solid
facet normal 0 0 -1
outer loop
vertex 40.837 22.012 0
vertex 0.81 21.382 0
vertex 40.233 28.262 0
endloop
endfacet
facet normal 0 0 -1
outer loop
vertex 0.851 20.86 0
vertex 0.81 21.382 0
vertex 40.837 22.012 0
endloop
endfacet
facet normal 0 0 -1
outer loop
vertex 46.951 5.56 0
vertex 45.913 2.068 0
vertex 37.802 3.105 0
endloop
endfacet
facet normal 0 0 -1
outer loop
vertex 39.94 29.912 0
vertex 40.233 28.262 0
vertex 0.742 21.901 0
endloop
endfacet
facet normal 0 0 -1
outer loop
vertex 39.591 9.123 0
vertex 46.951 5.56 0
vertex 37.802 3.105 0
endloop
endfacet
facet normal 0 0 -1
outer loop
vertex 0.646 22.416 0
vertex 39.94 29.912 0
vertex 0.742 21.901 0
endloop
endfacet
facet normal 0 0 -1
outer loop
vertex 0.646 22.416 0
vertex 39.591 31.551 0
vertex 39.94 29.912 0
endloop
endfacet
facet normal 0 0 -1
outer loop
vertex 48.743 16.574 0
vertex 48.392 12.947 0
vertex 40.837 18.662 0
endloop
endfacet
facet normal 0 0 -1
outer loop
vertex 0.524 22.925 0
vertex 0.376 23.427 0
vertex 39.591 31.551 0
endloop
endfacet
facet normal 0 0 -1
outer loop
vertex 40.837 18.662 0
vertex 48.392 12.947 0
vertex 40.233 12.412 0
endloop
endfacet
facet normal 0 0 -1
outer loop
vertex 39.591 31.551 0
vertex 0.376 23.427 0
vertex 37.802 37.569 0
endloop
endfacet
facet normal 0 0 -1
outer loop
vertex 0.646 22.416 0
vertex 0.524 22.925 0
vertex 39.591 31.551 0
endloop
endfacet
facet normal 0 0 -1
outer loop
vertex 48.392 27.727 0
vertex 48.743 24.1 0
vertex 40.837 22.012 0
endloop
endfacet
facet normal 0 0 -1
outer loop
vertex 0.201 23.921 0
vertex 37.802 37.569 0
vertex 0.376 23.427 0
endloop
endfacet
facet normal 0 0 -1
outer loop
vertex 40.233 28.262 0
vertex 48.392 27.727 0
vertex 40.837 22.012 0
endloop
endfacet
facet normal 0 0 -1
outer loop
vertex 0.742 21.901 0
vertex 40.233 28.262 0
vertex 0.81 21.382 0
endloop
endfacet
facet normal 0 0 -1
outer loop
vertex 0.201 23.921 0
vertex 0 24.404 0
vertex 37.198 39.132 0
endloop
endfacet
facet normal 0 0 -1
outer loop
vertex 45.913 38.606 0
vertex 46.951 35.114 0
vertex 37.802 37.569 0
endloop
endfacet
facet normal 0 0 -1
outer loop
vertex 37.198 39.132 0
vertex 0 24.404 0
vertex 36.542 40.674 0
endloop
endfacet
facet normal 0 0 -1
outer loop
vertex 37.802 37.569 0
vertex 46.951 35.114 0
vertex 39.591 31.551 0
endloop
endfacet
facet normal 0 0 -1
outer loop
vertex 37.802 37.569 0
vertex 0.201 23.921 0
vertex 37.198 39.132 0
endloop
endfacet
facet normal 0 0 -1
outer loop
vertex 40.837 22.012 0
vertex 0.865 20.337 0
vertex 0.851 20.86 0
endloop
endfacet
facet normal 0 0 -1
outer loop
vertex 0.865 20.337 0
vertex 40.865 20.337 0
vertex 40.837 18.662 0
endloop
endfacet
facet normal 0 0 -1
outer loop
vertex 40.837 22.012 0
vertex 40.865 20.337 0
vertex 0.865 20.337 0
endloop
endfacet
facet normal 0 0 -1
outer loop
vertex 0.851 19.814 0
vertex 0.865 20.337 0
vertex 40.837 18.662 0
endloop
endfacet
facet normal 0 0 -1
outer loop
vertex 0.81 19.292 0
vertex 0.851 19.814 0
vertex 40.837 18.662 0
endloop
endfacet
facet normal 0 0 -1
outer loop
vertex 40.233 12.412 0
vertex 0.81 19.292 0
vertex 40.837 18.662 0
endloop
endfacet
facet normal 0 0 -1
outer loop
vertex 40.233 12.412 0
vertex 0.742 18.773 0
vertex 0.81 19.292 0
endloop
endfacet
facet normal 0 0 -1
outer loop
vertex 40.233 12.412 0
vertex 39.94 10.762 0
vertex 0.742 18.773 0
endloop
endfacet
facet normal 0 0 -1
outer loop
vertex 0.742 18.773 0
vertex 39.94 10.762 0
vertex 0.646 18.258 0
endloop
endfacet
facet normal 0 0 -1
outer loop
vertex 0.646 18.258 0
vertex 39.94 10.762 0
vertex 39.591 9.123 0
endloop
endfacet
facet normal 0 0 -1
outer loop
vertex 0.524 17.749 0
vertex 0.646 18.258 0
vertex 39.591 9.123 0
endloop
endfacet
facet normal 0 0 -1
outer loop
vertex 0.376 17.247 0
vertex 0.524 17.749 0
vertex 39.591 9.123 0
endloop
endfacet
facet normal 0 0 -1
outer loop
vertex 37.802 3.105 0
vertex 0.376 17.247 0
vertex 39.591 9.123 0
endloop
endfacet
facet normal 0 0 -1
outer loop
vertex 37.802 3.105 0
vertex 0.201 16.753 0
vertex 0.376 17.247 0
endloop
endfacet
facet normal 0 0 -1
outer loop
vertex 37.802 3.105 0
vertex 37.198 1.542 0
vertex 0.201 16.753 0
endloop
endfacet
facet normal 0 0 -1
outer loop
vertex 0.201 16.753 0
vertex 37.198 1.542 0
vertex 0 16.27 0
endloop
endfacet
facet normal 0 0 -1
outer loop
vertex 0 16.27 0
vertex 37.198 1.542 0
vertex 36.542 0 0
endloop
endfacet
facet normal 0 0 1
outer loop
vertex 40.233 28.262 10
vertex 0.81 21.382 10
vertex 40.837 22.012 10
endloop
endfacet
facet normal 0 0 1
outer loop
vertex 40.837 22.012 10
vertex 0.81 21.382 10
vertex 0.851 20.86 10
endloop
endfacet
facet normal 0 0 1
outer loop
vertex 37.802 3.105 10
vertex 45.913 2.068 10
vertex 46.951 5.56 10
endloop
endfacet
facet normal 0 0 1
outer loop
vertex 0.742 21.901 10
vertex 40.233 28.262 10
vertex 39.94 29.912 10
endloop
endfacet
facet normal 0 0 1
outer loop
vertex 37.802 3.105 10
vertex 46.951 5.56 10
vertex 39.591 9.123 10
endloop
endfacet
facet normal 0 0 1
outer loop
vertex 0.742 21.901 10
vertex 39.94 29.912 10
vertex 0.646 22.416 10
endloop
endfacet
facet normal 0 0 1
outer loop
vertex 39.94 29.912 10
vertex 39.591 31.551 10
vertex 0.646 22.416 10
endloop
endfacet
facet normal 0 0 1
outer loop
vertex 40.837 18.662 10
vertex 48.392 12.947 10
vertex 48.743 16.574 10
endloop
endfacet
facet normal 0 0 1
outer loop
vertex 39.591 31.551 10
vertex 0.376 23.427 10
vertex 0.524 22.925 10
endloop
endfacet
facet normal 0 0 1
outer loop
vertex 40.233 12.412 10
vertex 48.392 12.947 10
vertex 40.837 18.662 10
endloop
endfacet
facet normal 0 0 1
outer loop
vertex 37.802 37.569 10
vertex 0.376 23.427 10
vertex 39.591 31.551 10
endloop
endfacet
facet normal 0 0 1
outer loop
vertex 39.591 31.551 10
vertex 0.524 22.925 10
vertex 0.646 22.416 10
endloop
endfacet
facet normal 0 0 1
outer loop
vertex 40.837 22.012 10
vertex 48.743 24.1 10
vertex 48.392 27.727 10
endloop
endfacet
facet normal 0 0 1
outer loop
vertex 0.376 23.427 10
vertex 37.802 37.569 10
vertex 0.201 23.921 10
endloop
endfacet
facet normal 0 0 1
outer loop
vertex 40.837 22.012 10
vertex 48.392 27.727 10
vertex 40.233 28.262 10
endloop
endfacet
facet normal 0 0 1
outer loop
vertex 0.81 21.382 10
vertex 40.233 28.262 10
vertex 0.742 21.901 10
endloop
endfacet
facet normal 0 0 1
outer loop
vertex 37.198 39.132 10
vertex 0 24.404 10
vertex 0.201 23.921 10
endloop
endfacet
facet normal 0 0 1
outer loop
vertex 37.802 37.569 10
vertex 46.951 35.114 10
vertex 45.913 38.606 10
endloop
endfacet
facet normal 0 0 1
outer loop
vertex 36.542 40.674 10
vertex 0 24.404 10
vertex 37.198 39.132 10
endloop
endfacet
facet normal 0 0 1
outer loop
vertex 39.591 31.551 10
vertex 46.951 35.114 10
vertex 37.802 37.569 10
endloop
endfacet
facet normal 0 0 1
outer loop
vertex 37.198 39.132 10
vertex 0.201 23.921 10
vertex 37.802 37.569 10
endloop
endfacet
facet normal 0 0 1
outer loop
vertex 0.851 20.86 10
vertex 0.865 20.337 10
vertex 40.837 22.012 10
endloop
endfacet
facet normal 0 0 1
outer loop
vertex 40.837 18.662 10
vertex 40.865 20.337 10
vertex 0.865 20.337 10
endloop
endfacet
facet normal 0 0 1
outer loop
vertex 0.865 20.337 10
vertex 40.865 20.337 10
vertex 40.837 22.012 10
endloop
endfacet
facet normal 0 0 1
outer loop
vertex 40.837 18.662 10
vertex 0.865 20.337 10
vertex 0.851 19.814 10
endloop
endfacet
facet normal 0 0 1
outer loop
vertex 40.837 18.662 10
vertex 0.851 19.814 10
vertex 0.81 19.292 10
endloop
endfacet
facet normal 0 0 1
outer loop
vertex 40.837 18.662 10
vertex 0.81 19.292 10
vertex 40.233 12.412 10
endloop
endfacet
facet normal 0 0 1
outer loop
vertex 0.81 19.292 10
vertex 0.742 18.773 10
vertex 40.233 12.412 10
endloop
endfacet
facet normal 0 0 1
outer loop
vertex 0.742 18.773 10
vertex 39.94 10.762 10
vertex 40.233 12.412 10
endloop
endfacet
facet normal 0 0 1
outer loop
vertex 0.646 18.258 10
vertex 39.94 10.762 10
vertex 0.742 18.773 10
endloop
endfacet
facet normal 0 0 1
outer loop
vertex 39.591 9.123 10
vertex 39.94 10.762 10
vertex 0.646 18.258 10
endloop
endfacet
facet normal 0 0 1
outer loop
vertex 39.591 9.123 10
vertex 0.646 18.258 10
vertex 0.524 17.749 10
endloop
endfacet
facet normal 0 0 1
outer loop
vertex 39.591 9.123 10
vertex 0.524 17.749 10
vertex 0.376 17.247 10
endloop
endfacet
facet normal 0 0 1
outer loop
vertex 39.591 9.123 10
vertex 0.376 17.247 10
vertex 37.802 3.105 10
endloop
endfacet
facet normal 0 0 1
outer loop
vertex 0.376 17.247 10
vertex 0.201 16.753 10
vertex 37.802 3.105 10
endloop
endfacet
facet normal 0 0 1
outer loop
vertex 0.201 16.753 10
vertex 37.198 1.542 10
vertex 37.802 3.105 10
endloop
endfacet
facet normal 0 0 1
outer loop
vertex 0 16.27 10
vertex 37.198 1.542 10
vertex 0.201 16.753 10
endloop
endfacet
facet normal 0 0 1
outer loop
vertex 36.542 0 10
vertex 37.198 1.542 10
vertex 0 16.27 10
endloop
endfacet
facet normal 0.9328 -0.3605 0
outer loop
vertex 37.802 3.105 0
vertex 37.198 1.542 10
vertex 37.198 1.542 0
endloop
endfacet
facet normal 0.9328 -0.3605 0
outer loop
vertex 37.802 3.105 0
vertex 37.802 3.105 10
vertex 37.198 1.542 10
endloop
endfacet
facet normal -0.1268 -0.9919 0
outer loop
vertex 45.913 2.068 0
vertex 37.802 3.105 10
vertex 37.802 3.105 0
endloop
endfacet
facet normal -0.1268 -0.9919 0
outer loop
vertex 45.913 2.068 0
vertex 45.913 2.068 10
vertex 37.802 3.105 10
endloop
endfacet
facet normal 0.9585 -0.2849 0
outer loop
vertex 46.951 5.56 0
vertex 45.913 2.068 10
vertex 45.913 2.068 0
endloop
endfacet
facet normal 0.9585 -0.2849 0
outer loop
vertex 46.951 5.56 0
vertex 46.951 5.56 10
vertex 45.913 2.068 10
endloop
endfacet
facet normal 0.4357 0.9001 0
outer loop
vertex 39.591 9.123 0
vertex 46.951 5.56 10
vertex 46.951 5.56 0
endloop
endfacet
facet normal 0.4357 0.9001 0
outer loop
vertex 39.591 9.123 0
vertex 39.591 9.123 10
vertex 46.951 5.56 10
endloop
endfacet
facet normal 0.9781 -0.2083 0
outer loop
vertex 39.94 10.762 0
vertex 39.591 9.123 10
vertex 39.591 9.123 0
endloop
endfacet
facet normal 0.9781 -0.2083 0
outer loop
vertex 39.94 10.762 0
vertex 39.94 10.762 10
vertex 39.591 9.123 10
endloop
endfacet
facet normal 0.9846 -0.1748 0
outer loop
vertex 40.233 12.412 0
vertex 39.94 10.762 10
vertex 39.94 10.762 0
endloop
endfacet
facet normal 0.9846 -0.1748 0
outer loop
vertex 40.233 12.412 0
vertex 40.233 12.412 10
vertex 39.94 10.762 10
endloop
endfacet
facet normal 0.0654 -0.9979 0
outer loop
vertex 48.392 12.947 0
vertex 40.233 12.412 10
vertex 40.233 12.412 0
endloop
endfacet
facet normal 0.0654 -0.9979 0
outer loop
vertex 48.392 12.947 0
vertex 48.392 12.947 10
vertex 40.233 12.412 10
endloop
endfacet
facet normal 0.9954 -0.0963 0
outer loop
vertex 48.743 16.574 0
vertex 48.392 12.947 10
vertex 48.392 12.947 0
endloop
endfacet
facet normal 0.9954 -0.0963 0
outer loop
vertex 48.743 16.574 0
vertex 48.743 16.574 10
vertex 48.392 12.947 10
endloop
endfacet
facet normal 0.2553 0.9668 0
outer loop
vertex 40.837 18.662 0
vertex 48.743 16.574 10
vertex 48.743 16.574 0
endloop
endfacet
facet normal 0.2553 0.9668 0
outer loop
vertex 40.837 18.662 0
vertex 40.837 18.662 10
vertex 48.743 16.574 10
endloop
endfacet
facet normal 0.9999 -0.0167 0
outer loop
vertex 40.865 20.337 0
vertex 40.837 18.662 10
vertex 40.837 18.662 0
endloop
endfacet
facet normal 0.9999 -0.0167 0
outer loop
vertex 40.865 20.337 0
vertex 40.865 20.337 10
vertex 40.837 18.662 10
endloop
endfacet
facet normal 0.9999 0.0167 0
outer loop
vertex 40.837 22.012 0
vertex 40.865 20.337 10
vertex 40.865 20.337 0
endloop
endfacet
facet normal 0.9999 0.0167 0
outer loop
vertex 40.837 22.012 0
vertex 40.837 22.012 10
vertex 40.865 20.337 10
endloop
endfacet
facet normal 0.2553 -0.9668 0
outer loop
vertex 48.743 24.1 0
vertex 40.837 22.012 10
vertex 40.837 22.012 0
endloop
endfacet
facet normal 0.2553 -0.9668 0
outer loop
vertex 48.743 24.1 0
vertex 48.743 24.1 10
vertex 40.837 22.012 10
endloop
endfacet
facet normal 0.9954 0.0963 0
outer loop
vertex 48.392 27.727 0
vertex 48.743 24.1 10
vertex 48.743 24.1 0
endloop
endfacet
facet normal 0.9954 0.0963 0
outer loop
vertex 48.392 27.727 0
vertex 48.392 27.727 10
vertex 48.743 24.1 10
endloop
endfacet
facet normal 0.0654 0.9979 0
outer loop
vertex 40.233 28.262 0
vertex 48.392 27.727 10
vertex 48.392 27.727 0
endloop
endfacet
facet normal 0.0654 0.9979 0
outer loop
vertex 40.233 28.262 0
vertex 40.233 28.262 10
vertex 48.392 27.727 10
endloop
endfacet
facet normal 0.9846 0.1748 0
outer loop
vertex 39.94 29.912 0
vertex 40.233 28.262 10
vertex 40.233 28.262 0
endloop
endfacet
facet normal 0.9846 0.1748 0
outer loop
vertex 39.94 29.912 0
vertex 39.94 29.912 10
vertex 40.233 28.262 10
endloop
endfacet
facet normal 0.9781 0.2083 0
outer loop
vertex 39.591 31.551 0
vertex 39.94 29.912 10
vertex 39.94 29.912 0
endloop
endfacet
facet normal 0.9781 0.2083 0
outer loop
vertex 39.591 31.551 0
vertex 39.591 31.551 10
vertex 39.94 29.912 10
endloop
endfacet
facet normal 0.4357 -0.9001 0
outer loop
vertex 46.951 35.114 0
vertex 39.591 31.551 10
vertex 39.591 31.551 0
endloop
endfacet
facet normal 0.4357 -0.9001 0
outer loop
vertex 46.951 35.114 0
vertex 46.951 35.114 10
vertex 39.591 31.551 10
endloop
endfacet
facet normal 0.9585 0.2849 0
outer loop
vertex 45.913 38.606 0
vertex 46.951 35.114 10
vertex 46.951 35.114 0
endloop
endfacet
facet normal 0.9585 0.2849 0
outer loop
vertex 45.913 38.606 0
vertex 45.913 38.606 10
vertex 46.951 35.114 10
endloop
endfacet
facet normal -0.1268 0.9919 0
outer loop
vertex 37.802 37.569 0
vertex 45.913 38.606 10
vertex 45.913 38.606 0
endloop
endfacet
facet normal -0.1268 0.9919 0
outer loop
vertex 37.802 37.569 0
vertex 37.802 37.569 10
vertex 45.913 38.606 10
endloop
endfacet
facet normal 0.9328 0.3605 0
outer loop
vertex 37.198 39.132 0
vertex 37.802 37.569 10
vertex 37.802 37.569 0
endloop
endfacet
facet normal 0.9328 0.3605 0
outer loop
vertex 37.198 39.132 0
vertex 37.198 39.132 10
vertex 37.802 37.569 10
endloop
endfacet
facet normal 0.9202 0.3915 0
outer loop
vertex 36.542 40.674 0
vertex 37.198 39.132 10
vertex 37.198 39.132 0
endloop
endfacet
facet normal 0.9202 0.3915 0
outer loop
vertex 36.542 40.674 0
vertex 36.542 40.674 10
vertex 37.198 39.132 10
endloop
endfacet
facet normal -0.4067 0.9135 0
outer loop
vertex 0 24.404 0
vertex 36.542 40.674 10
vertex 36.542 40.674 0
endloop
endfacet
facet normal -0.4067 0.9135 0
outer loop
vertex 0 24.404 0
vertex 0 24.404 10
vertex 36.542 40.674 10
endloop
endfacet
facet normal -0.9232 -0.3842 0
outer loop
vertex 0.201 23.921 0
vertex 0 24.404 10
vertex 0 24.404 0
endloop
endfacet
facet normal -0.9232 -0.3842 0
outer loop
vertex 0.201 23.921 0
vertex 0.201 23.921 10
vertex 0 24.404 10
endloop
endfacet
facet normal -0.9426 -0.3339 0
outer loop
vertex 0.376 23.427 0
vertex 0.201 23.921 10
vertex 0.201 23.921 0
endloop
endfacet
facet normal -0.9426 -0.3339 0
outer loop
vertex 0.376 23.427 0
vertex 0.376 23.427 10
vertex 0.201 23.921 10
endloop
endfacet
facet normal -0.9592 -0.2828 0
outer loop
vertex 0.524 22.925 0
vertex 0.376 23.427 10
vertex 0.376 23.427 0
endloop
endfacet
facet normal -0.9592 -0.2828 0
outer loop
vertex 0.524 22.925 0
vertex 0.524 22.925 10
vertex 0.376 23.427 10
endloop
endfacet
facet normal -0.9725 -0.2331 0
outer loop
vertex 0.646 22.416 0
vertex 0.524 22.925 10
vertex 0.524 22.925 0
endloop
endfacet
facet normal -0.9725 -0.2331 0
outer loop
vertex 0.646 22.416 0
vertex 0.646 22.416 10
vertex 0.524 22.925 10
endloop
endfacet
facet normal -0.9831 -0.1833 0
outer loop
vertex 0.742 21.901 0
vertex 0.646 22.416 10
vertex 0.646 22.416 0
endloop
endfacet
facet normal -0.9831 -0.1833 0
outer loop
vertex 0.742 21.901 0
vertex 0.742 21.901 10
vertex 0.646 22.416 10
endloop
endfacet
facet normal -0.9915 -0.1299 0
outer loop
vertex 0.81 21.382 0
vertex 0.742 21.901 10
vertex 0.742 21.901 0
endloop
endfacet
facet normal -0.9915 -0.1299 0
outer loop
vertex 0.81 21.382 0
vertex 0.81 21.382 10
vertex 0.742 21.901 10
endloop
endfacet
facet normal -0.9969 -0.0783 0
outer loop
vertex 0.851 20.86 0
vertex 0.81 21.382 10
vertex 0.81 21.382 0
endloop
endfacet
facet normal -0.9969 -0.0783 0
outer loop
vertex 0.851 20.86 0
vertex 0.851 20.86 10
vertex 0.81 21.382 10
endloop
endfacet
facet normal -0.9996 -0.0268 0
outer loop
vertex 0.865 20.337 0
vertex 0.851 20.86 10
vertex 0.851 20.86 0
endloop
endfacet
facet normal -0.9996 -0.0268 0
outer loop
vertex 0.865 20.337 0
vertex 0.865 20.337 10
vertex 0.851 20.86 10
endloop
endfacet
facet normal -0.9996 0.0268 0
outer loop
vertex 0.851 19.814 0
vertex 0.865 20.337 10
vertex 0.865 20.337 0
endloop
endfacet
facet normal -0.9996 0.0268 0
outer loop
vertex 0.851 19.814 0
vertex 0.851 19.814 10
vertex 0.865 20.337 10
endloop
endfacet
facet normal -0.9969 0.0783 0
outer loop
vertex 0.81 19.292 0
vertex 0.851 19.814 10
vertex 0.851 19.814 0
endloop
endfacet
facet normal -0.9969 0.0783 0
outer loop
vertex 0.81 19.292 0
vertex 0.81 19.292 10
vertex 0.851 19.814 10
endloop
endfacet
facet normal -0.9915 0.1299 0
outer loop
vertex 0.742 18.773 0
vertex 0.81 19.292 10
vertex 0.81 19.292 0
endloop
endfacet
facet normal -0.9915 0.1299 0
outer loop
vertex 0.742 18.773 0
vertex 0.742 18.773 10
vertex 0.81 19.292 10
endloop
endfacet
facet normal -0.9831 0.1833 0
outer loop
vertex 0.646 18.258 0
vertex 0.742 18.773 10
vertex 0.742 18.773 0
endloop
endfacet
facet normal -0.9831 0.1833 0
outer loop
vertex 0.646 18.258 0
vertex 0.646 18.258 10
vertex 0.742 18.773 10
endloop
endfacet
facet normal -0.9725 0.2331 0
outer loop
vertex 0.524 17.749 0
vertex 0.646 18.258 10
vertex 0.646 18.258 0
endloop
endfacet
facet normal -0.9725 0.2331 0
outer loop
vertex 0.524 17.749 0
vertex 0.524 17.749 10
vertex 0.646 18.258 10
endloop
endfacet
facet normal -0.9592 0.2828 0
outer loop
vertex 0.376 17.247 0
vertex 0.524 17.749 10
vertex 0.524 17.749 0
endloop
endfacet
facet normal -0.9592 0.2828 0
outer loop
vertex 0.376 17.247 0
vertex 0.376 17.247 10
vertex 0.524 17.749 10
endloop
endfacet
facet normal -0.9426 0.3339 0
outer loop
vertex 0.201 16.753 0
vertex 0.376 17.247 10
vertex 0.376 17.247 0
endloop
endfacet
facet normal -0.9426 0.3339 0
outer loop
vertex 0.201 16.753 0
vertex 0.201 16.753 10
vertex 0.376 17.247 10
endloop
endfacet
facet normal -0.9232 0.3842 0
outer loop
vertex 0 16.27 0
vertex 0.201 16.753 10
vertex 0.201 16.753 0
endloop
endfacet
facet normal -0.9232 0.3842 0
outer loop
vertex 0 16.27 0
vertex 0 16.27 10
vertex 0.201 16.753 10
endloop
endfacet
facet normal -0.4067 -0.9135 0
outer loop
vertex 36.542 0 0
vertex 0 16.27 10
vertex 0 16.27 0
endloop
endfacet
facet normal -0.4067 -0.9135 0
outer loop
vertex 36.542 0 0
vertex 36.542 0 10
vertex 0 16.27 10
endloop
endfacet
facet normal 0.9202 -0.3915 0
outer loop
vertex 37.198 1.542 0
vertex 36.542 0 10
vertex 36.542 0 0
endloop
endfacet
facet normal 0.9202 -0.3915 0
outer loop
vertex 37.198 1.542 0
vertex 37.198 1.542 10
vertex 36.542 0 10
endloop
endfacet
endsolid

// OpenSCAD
$fn = 32;

// ----------------------------------------------------------------------
// Gear sector: 4 teeth on 48 degrees
// ----------------------------------------------------------------------

// --- parameters (mm) ---
sector_angle = 48;        // sector angle, degrees
root_r = 50;              // root circle radius
tooth_h = 8;              // tooth height over the root circle
teeth = 4;                // number of teeth on the sector
hub_r = 10;               // hub bore radius
plate_t = 10;             // sector thickness, Z
arc_step = 3;             // sampling step of the root/hub arcs, degrees

tip_r = root_r + tooth_h;  // tip circle radius

profile = [[36.542, 0], [37.198, 1.542], [37.802, 3.105], [45.913, 2.068], [46.951, 5.56], [39.591, 9.123], [39.94, 10.762], [40.233, 12.412], [48.392, 12.947], [48.743, 16.574], [40.837, 18.662], [40.865, 20.337], [40.837, 22.012], [48.743, 24.1], [48.392, 27.727], [40.233, 28.262], [39.94, 29.912], [39.591, 31.551], [46.951, 35.114], [45.913, 38.606], [37.802, 37.569], [37.198, 39.132], [36.542, 40.674], [0, 24.404], [0.201, 23.921], [0.376, 23.427], [0.524, 22.925], [0.646, 22.416], [0.742, 21.901], [0.81, 21.382], [0.851, 20.86], [0.865, 20.337], [0.851, 19.814], [0.81, 19.292], [0.742, 18.773], [0.646, 18.258], [0.524, 17.749], [0.376, 17.247], [0.201, 16.753], [0, 16.27]];  // primary outline, 40 points, counter clockwise

// --- the one profile operation ---
linear_extrude(height = plate_t) polygon(points = profile);
